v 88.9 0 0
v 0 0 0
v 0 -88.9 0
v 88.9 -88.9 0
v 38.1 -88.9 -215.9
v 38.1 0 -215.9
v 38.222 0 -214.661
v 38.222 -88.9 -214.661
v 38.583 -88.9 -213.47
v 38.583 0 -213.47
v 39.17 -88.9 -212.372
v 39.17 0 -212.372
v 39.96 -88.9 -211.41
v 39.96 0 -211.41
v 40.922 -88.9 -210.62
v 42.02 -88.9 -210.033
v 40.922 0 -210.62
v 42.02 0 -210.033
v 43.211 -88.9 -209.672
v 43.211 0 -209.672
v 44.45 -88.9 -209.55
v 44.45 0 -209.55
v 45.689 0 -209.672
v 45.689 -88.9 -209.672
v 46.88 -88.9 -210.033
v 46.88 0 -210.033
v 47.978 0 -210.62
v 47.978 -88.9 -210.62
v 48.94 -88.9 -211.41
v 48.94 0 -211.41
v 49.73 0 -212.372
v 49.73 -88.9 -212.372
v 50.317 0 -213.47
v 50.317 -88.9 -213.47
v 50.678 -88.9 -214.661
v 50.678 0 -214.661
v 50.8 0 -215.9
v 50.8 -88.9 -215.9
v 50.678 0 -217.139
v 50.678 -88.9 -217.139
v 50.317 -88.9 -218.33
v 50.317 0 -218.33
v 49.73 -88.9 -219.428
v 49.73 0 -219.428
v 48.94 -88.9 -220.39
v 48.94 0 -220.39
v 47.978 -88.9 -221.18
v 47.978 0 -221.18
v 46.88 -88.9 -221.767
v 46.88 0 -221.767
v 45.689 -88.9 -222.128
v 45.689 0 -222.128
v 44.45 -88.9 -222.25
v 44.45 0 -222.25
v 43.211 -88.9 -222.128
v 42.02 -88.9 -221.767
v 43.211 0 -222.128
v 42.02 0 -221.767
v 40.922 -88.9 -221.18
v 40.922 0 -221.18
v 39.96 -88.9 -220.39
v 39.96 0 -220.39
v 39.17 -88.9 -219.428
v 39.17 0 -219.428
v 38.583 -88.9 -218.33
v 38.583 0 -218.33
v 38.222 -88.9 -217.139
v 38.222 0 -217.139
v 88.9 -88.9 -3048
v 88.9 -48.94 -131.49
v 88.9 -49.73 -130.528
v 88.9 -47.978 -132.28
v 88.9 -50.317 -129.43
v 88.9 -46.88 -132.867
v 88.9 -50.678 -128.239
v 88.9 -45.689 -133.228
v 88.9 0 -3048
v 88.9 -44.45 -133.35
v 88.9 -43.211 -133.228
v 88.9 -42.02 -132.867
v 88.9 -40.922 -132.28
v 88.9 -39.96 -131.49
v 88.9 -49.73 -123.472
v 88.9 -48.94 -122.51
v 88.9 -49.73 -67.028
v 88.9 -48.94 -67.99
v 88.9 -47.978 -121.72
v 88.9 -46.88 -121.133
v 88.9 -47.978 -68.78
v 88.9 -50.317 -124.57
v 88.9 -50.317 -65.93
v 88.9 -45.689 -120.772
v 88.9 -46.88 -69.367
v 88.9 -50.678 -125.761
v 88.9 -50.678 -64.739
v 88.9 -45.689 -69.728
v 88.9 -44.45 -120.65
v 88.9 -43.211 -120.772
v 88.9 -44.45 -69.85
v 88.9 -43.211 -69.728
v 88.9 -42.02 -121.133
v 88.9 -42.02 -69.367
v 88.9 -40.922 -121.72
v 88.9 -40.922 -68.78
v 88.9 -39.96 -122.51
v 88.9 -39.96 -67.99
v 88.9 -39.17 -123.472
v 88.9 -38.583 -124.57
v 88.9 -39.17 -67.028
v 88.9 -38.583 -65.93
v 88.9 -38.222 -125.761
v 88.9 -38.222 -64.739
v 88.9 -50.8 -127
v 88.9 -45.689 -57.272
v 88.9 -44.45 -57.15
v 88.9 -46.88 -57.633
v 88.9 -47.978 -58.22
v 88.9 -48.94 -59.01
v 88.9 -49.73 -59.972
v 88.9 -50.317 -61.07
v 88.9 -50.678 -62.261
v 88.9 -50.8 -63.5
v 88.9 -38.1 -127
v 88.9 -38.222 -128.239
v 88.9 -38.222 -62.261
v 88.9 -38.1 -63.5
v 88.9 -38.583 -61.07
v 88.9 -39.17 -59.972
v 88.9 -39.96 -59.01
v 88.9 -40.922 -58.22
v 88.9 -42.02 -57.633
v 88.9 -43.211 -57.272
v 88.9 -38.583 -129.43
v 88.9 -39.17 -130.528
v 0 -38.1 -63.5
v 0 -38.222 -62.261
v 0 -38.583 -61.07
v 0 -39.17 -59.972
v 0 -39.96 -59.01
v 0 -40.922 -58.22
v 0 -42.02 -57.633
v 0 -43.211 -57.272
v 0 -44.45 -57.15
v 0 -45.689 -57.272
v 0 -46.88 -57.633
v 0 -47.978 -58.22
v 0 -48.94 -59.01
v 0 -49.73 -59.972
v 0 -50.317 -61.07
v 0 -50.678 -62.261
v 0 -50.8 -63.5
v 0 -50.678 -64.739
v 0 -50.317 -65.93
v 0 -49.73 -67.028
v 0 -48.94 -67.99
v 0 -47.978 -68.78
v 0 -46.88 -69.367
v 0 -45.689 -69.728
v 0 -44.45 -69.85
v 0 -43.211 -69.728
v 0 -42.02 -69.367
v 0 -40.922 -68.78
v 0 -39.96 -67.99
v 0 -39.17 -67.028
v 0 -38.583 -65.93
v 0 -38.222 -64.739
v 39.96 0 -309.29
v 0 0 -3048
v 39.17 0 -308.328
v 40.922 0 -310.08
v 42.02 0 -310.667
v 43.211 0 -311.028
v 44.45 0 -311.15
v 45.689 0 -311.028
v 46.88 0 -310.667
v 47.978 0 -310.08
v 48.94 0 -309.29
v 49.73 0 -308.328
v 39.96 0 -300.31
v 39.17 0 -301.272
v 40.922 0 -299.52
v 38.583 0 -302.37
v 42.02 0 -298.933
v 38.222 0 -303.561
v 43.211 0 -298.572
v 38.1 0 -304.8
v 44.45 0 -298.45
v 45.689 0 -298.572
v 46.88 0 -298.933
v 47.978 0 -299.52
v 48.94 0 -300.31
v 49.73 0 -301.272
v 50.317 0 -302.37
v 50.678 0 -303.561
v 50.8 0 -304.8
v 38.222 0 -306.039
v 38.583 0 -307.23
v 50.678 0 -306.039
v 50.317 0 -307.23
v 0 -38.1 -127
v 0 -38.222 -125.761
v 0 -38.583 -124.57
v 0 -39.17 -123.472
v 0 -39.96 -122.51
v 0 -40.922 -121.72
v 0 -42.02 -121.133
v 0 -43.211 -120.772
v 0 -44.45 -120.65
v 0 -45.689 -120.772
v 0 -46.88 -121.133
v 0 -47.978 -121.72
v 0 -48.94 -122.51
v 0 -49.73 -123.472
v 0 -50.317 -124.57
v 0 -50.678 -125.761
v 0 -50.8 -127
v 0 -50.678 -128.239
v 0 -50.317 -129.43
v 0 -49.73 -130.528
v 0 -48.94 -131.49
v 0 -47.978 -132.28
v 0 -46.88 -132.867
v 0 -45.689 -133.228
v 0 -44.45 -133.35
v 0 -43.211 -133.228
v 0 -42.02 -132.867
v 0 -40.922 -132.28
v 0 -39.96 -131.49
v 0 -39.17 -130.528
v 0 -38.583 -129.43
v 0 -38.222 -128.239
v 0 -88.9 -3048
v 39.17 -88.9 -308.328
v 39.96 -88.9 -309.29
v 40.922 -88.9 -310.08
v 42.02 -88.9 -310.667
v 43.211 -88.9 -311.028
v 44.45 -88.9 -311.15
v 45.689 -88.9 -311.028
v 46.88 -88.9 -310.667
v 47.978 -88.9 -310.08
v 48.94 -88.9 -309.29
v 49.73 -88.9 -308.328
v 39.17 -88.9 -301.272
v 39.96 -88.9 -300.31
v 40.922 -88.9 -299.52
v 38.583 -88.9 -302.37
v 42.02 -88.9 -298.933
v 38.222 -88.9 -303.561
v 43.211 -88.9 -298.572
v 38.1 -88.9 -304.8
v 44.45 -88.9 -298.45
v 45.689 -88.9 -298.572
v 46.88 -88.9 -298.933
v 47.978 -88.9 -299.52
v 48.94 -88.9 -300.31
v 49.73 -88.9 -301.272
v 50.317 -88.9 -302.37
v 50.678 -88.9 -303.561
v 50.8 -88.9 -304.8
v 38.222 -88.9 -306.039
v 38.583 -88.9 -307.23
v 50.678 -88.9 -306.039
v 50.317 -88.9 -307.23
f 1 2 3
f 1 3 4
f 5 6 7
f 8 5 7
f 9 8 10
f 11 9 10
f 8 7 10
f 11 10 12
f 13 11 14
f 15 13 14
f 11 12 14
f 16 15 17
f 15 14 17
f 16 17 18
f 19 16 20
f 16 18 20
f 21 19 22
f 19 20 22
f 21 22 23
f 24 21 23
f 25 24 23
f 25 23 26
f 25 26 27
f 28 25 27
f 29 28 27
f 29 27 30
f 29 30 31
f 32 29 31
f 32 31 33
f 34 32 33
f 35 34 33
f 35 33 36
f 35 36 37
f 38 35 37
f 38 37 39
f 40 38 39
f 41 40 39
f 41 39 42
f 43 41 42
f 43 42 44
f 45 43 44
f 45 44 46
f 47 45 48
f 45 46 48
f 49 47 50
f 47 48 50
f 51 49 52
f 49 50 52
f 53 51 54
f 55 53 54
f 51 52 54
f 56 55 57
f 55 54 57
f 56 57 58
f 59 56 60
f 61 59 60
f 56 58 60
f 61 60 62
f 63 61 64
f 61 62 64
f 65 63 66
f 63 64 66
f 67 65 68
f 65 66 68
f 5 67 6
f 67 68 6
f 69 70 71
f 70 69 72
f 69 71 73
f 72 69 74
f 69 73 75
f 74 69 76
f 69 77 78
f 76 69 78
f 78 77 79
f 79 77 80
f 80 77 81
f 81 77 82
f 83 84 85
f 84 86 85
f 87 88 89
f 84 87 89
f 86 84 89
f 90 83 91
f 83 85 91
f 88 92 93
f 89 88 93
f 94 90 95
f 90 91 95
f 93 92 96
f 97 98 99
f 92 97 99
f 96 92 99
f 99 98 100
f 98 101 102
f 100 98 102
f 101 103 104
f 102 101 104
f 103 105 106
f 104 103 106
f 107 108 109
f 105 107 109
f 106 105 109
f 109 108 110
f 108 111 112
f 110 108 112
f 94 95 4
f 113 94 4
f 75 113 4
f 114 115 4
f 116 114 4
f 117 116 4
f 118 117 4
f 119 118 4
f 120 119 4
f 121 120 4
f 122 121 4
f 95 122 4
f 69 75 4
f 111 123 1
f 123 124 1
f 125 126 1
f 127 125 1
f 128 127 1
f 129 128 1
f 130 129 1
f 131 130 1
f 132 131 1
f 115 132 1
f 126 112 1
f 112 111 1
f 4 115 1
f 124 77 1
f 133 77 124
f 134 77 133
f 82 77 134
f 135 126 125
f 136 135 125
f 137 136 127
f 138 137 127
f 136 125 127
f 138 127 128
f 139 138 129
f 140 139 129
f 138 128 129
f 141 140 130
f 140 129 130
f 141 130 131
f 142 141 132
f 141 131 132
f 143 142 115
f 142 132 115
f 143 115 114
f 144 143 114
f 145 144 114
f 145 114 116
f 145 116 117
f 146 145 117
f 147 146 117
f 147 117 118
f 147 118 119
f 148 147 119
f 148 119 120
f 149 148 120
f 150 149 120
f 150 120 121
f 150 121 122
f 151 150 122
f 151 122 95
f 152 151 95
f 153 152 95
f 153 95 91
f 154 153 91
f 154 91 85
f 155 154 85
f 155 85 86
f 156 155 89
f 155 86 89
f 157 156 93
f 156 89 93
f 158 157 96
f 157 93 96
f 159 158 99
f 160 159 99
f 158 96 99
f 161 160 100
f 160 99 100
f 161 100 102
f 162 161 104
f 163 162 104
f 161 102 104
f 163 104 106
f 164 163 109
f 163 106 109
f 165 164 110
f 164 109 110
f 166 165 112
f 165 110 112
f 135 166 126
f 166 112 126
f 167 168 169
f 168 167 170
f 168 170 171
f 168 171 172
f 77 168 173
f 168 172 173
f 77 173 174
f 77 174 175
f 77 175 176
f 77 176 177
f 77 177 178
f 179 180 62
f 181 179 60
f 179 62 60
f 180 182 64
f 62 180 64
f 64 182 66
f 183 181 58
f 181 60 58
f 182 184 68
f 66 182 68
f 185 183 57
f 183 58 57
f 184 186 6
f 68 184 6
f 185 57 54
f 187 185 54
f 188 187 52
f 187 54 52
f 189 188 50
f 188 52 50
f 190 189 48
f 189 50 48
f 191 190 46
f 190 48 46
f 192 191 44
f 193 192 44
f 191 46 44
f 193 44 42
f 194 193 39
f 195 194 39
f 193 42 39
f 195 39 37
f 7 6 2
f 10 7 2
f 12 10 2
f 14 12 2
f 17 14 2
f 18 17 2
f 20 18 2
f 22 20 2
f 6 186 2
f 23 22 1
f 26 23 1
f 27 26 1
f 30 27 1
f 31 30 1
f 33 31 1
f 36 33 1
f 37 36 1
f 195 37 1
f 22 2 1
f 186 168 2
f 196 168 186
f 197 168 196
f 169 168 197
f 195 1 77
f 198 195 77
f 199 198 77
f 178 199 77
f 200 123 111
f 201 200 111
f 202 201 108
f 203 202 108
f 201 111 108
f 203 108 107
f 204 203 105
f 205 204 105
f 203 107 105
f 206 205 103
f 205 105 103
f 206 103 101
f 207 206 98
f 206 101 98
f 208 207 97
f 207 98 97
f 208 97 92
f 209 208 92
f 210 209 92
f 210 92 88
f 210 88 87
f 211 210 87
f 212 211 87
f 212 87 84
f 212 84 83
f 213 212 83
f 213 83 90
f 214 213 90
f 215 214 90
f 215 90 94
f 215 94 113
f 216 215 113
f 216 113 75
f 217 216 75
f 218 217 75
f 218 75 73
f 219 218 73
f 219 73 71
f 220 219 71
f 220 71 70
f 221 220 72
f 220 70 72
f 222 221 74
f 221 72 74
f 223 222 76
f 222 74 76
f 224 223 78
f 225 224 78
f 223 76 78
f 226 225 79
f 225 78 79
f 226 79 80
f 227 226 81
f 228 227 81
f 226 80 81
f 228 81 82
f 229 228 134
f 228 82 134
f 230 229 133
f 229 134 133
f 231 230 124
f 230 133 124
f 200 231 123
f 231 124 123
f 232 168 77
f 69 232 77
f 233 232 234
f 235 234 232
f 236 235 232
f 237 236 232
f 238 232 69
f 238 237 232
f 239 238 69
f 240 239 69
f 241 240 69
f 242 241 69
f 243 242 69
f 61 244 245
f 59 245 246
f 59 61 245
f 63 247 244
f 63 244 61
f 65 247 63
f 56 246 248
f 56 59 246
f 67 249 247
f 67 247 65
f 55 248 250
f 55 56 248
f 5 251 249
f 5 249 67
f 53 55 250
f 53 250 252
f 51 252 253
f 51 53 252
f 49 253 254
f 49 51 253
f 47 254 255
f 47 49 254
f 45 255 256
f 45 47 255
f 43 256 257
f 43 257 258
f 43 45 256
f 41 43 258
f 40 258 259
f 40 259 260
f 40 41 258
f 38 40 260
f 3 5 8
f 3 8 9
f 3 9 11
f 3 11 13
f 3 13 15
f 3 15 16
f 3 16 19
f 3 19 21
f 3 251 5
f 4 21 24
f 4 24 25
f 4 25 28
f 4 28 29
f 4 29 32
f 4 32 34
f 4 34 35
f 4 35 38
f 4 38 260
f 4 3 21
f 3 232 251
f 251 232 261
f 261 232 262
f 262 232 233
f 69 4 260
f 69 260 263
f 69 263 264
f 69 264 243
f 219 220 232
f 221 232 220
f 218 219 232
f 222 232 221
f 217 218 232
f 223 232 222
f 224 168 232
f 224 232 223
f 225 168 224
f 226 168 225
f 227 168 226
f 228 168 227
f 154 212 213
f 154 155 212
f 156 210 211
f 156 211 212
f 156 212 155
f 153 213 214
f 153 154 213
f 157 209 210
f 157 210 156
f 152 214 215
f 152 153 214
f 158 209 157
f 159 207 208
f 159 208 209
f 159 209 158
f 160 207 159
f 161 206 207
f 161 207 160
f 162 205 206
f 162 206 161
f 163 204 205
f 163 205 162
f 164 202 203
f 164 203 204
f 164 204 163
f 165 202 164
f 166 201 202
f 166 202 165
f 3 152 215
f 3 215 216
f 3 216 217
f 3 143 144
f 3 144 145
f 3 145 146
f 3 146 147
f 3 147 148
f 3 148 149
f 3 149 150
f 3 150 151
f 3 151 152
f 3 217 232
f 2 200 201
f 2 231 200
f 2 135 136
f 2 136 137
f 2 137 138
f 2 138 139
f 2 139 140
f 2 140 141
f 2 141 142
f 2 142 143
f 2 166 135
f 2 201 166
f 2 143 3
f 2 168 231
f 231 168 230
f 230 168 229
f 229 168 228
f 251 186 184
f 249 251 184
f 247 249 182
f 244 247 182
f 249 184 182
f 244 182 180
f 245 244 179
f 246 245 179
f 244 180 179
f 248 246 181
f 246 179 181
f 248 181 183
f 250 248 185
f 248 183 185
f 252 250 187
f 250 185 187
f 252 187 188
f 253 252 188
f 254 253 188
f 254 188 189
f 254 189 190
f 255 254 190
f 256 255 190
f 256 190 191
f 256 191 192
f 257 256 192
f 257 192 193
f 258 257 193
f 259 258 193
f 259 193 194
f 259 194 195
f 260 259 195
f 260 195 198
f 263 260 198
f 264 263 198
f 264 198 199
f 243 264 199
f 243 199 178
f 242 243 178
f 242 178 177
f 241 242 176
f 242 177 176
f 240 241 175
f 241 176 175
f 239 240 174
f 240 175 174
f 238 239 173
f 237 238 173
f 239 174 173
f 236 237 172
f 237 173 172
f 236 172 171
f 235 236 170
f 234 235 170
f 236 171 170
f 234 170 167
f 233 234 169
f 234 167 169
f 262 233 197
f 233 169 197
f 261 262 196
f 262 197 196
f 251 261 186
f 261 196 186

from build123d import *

# Parameters (mm, degrees)
F0_W     = 88.9
F0_H     = 3048
F1_DEPTH = 88.9
F3_D     = 12.7
F5_D     = 12.7


# Not quite as in the source:
# - a length typed as a fraction of an inch, garbled in the dataset ("3 / 203.2 mm" for 3/8 in), is restored


with BuildPart() as f1:
    # F0 (on Front) → F1 (new body)
    with BuildSketch(Plane.XZ):
        with Locations((44.45, -1524)):
            Rectangle(F0_W, F0_H)
    extrude(amount=F1_DEPTH)

    # F3 (through all)
    with Locations(Plane.XZ.offset(88.9)):
        with Locations((44.45, -215.9), (44.45, -304.8)):
            Hole(F3_D / 2)

    # F5 (through all)
    with Locations(Plane(origin=(0, 0, 0), x_dir=(0, -1, 0), z_dir=(-1, 0, 0))):
        with Locations((44.45, -63.5), (44.45, -127)):
            Hole(F5_D / 2)


solid = f1.part
